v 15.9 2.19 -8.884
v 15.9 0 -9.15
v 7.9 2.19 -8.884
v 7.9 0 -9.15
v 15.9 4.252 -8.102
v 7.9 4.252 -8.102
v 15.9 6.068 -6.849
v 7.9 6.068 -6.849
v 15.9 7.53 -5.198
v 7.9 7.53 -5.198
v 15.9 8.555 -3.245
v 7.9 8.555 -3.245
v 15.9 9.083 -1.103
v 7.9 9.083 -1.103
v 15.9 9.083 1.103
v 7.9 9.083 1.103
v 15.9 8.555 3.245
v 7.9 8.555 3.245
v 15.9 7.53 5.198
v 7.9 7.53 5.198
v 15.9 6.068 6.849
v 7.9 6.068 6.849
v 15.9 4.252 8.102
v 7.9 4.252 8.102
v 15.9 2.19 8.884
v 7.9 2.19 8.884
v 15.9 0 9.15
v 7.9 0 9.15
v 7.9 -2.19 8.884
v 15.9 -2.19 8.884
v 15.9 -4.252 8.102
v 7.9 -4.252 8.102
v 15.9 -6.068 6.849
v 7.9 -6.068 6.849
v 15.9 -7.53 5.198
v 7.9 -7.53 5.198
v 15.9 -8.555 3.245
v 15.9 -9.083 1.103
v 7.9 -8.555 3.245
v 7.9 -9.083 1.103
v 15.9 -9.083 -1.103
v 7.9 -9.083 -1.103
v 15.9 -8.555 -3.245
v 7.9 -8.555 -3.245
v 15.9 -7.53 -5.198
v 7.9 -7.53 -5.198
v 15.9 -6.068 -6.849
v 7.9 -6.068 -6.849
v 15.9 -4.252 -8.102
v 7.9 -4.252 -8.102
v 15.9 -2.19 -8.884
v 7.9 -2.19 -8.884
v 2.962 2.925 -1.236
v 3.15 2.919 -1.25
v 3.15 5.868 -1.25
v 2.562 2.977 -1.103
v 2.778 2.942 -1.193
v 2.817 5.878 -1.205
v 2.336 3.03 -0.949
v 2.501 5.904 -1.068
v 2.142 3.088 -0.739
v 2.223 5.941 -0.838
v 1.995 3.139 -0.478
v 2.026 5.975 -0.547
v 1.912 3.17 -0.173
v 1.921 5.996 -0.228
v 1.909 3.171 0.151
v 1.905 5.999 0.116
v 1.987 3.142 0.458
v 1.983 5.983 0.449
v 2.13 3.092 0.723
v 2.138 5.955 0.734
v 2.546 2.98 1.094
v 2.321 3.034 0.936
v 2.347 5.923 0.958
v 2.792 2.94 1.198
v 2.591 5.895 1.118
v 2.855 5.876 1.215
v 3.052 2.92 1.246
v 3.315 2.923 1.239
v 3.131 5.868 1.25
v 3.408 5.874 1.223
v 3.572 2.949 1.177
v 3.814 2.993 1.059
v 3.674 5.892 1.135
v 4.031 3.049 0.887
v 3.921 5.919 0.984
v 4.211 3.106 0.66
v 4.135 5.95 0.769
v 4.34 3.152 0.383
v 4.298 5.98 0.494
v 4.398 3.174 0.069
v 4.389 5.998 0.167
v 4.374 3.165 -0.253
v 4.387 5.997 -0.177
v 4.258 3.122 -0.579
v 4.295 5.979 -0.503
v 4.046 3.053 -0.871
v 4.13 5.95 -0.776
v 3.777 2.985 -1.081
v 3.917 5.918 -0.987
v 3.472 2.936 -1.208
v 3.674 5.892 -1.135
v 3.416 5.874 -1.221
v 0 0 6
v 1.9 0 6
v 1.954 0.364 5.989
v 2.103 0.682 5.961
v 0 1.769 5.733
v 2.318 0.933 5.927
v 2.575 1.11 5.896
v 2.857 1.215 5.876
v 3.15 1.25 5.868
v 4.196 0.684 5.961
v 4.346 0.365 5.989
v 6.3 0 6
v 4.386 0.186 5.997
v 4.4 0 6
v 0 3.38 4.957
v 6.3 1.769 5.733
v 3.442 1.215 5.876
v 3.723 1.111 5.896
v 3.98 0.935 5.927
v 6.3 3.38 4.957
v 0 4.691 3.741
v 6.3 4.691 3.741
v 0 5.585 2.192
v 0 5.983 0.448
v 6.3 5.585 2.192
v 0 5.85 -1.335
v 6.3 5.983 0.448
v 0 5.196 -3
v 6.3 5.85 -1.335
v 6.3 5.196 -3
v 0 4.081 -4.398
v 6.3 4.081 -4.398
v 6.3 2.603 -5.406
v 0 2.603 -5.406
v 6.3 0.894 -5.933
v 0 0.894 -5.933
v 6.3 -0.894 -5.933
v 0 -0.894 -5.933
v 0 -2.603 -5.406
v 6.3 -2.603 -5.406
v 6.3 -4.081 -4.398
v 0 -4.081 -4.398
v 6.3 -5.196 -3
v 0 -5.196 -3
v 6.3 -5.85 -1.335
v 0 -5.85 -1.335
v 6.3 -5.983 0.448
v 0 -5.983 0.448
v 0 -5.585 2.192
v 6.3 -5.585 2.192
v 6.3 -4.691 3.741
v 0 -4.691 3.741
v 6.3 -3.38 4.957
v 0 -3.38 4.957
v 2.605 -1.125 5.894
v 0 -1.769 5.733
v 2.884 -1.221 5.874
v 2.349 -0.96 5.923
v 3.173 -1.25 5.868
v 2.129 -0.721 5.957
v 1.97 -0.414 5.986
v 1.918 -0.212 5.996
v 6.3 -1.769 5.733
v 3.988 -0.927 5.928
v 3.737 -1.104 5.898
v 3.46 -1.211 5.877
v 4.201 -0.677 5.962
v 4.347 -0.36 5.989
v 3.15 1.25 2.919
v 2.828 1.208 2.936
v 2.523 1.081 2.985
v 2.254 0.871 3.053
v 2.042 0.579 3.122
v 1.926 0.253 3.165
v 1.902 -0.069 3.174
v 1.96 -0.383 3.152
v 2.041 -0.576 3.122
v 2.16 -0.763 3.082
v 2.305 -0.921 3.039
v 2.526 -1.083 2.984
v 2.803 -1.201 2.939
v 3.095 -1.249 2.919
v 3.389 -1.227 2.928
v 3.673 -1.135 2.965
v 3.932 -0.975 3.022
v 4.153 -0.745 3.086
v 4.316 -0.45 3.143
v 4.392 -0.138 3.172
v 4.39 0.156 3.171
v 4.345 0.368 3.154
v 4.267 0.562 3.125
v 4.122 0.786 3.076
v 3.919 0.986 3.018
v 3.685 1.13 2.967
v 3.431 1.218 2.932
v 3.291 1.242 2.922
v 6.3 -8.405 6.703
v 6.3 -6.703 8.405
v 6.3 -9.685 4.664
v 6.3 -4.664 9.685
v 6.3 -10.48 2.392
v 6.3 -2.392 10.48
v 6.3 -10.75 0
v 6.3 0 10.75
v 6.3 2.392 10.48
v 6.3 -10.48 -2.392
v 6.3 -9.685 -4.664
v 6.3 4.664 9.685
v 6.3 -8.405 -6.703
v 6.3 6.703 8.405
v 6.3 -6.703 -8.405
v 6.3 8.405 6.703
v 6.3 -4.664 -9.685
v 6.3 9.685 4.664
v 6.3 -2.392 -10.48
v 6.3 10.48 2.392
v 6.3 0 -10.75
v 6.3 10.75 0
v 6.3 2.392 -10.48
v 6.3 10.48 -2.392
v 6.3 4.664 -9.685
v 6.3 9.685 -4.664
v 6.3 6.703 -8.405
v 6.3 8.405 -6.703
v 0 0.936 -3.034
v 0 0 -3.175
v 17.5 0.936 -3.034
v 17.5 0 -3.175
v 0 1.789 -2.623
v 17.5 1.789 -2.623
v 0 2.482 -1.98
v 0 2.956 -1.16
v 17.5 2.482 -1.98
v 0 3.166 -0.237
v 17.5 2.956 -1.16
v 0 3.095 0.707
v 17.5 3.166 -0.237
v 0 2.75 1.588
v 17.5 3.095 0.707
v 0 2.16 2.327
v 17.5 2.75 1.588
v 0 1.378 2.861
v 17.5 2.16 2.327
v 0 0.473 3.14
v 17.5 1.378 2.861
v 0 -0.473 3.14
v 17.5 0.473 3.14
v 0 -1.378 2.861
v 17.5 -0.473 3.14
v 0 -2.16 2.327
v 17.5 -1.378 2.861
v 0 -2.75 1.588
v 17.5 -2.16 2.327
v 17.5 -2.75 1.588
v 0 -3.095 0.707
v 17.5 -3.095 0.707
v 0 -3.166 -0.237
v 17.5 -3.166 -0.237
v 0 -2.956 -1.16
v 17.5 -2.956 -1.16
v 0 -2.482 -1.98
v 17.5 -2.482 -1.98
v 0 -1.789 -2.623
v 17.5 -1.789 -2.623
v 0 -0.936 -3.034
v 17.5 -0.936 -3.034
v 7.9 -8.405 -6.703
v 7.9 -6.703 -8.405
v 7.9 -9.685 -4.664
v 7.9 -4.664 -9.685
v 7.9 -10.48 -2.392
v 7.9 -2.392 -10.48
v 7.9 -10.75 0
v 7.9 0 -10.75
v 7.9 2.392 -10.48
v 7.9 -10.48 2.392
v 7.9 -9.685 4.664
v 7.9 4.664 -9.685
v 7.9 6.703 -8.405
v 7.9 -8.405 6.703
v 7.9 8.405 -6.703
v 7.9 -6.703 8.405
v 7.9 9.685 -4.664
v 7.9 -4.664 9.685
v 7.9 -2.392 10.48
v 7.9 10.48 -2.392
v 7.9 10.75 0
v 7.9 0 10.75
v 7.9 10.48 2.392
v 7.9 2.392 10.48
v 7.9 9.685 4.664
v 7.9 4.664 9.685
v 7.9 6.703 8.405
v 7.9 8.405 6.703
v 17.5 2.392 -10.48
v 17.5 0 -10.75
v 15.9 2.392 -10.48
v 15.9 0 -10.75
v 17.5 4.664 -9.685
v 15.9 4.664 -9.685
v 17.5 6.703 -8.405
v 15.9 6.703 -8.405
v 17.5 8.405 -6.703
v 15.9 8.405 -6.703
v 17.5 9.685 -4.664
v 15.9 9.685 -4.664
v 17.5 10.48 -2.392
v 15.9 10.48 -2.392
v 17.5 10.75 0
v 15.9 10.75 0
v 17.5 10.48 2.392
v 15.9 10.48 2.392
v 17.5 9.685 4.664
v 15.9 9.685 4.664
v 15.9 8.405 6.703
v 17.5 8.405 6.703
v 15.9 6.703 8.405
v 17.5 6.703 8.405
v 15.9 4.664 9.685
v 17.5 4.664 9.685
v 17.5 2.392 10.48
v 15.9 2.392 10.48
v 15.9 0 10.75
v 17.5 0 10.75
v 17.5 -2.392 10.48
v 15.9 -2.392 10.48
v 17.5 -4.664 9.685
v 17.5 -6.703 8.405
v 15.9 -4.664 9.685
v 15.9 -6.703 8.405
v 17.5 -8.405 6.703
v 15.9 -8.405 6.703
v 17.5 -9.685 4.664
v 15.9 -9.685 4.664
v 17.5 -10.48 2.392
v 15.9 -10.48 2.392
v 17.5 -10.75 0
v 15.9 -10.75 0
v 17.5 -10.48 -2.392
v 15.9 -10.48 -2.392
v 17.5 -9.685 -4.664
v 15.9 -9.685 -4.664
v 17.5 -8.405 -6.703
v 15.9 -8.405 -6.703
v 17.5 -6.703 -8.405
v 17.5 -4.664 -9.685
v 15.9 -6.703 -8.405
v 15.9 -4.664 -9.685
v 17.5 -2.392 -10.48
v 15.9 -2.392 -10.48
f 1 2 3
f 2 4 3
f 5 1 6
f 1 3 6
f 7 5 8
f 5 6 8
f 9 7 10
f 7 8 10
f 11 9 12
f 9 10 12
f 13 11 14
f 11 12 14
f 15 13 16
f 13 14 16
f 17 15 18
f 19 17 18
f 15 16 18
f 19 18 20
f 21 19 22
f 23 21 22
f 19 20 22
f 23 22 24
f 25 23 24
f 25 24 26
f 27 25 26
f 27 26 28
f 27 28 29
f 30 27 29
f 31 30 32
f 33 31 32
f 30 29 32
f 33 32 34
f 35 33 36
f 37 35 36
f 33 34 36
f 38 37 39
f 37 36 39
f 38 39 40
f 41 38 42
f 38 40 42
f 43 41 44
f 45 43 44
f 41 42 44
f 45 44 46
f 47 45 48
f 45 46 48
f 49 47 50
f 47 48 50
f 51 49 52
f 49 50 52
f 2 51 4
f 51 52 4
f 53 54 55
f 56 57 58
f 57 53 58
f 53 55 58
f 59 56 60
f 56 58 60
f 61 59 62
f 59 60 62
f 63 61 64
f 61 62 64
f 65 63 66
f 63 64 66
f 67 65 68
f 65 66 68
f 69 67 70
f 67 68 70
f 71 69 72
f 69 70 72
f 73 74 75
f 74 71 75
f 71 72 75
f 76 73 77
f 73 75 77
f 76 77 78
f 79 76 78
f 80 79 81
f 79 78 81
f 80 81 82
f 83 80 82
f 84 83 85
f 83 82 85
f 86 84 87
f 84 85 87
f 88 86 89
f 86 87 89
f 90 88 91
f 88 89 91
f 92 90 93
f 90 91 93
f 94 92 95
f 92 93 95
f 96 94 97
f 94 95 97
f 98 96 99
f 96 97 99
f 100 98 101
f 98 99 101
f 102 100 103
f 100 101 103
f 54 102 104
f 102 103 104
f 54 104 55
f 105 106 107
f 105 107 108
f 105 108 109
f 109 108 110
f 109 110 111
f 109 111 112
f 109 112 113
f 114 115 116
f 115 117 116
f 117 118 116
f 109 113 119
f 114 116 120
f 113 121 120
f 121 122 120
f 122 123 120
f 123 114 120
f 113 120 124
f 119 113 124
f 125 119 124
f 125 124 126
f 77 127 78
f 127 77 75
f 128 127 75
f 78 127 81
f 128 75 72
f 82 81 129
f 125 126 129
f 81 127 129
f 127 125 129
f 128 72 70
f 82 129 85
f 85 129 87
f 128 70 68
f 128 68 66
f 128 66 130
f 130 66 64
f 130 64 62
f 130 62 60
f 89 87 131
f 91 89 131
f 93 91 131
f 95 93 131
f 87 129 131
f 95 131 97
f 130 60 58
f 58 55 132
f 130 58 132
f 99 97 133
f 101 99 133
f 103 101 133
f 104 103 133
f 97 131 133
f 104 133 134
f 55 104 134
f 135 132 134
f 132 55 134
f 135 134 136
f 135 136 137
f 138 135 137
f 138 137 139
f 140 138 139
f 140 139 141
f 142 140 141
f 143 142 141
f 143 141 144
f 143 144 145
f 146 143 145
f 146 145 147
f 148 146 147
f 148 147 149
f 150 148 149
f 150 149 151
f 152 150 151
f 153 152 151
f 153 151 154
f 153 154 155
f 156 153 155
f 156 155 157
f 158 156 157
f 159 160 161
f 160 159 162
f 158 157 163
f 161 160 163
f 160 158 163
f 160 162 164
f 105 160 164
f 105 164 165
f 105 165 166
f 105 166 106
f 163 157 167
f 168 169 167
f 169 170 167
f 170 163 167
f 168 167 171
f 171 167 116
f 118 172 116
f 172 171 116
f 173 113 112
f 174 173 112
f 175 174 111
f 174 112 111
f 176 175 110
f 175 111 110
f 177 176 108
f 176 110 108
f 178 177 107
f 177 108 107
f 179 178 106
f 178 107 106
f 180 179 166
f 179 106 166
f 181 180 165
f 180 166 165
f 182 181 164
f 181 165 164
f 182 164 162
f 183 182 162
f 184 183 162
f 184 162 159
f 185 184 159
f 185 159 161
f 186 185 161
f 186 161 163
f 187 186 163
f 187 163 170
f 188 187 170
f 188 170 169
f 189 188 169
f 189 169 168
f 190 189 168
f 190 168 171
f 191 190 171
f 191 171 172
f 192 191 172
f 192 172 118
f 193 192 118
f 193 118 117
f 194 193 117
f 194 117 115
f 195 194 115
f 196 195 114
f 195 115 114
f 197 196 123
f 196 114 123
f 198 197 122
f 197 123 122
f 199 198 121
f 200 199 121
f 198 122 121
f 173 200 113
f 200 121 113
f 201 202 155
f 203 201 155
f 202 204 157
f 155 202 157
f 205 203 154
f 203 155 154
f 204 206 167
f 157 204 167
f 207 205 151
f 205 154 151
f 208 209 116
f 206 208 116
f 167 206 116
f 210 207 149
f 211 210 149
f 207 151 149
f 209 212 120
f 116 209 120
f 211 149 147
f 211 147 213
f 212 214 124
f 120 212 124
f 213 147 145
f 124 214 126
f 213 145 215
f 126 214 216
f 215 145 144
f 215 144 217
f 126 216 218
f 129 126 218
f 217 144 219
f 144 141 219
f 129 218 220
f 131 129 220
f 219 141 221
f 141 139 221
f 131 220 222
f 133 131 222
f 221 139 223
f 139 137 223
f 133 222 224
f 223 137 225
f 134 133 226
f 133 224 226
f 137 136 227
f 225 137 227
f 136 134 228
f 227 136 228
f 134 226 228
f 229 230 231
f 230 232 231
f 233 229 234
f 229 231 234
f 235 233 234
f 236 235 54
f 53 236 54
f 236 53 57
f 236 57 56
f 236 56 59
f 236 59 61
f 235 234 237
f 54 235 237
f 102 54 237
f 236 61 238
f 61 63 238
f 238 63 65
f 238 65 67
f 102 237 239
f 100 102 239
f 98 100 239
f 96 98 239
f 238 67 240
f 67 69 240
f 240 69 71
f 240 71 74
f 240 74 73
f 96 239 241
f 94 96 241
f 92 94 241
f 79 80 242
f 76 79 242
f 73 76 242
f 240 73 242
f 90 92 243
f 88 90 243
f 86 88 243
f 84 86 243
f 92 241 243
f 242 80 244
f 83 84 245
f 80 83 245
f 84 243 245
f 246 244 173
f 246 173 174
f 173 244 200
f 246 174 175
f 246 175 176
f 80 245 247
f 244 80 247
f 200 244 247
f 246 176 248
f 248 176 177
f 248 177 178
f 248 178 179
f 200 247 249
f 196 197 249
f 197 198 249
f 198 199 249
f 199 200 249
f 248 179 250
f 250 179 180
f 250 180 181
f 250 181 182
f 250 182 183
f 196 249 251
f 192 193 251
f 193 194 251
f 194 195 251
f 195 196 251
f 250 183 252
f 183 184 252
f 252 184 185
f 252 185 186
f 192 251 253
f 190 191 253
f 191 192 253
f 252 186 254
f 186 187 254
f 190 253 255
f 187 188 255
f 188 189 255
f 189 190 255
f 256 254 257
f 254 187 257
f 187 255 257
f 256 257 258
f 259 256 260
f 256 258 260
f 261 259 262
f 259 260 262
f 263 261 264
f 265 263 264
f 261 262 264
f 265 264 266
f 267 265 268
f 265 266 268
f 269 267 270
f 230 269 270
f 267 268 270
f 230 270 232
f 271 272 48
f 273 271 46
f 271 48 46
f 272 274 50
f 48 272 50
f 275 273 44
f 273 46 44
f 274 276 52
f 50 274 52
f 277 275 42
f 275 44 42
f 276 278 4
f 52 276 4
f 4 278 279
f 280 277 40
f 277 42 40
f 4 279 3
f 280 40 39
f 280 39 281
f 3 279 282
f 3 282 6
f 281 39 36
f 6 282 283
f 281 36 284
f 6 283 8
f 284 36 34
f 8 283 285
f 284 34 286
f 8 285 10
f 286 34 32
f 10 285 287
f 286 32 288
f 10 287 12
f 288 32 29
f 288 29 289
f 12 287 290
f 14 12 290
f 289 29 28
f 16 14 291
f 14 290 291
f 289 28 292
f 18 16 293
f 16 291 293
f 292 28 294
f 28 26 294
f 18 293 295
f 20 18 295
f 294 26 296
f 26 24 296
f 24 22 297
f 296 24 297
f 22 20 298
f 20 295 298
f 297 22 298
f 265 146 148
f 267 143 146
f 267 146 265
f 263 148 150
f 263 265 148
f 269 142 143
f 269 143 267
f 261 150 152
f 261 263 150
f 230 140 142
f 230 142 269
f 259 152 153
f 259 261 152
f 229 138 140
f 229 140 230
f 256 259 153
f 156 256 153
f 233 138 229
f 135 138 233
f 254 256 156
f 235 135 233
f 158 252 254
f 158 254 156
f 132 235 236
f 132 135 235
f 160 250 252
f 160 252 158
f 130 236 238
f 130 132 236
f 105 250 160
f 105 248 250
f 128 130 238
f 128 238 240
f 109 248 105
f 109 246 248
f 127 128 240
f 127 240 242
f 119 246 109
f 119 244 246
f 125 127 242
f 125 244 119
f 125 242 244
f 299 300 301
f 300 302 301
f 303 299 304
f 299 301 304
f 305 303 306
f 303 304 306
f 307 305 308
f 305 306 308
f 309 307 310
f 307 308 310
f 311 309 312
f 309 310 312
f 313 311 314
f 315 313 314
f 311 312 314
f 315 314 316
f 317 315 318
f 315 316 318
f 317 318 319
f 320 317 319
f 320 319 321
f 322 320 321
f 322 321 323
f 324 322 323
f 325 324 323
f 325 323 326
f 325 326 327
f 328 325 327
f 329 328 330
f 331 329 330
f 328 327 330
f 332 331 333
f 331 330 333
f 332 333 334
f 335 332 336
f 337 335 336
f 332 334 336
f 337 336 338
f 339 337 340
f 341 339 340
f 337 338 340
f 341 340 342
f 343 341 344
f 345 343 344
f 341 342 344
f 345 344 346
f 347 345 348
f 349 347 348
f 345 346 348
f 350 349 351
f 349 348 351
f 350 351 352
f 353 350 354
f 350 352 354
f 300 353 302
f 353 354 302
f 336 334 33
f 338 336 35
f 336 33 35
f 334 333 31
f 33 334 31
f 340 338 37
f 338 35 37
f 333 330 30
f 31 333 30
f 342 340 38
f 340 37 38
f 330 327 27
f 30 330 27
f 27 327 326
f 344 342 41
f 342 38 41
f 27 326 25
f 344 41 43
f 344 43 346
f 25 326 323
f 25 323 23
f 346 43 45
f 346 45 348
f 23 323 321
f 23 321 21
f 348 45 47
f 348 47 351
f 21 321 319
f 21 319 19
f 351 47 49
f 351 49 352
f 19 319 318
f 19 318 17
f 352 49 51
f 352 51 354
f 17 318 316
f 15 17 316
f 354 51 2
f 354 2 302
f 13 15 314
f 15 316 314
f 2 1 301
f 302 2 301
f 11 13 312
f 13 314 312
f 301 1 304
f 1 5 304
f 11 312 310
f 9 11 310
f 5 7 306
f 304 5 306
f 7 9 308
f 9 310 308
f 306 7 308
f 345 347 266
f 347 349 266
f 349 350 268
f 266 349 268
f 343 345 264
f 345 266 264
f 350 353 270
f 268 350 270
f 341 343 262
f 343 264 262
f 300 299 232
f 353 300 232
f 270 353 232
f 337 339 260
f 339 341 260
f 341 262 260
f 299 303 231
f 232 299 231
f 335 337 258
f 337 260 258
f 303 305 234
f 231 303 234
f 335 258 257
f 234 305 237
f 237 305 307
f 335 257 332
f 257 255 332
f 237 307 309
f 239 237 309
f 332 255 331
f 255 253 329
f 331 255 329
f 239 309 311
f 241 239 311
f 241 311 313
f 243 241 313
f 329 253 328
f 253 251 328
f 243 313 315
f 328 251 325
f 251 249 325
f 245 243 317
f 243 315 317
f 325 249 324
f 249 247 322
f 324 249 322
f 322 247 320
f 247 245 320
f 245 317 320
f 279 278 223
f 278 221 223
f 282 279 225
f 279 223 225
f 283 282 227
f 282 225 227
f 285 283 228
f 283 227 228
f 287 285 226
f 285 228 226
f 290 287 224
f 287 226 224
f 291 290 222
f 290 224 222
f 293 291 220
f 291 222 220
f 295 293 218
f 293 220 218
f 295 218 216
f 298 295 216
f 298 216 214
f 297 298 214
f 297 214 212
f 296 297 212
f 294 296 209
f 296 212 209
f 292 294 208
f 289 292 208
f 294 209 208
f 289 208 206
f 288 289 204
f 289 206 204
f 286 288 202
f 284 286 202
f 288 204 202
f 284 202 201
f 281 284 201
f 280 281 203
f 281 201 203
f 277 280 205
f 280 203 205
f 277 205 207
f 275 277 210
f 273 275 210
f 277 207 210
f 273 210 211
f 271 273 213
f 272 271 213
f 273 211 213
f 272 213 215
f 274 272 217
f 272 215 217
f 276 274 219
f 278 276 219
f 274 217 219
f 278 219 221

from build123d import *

# Parameters (mm, degrees)
SKETCH2_R                       = 6
BOSS_EXTRUDE1_DEPTH             = 6.3
HOLE1_D                         = 6.35
SKETCH5_W                       = 1.25
SKETCH5_H                       = 7.831417296
F_2_5_2_5_DIAMETER_HOLE2_REACH  = 26.537
F_2_5_2_5_DIAMETER_HOLE2_BORE_R = 1.25


with BuildPart() as part:
    # Sketch1 → Revolve1 (revolve)
    with BuildSketch(Plane.XY, mode=Mode.PRIVATE) as revolve1_sk:
        Polygon((6.3, 10.75), (6.3, 0), (17.5, 0), (17.5, 10.75), (15.9, 10.75), (15.9, 9.15), (7.9, 9.15), (7.9, 10.75), align=None)
    revolve(revolve1_sk.sketch.rotate(Axis((6.3, 0, 0), (1, 0, 0)), 270), axis=Axis((6.3, 0, 0), (1, 0, 0)))

    # Sketch2 → Boss-Extrude1 (add)
    with BuildSketch(Plane.ZY.offset(-6.3)):
        Circle(SKETCH2_R)
    extrude(amount=BOSS_EXTRUDE1_DEPTH)

    # Hole1 (through all)
    with Locations(Plane.ZY):
        with Locations((0, 0)):
            Hole(HOLE1_D / 2)

    # Sketch5 → Ø2.5 (2.5) Diameter Hole1 (revolve, cut)
    with BuildSketch(Plane(origin=(3.15, 2.918582704, 0), x_dir=(0, 0, -1), z_dir=(1, 0, 0))):
        with Locations((0.625, 3.915708648)):
            Rectangle(SKETCH5_W, SKETCH5_H)
    revolve(axis=Axis((3.15, -3.431417296, 0), (0, 1, 0)), mode=Mode.SUBTRACT)

    # Ø2.5 (2.5) Diameter Hole2 bore (on position points) → Ø2.5 (2.5) Diameter Hole2 (cut, up to next)
    with BuildSketch(Plane(origin=(3.15, 0, 6), x_dir=(0, 1, 0), z_dir=(0, 0, 1)), mode=Mode.PRIVATE) as f_2_5_2_5_diameter_hole2_sk1:
        Circle(F_2_5_2_5_DIAMETER_HOLE2_BORE_R)
    f_2_5_2_5_diameter_hole2_tool1 = extrude(f_2_5_2_5_diameter_hole2_sk1.sketch, amount=-F_2_5_2_5_DIAMETER_HOLE2_REACH, mode=Mode.PRIVATE) & part.part
    add(f_2_5_2_5_diameter_hole2_tool1.solids().sort_by_distance((3.15, 0, 6))[0], mode=Mode.SUBTRACT)


solid = part.part
